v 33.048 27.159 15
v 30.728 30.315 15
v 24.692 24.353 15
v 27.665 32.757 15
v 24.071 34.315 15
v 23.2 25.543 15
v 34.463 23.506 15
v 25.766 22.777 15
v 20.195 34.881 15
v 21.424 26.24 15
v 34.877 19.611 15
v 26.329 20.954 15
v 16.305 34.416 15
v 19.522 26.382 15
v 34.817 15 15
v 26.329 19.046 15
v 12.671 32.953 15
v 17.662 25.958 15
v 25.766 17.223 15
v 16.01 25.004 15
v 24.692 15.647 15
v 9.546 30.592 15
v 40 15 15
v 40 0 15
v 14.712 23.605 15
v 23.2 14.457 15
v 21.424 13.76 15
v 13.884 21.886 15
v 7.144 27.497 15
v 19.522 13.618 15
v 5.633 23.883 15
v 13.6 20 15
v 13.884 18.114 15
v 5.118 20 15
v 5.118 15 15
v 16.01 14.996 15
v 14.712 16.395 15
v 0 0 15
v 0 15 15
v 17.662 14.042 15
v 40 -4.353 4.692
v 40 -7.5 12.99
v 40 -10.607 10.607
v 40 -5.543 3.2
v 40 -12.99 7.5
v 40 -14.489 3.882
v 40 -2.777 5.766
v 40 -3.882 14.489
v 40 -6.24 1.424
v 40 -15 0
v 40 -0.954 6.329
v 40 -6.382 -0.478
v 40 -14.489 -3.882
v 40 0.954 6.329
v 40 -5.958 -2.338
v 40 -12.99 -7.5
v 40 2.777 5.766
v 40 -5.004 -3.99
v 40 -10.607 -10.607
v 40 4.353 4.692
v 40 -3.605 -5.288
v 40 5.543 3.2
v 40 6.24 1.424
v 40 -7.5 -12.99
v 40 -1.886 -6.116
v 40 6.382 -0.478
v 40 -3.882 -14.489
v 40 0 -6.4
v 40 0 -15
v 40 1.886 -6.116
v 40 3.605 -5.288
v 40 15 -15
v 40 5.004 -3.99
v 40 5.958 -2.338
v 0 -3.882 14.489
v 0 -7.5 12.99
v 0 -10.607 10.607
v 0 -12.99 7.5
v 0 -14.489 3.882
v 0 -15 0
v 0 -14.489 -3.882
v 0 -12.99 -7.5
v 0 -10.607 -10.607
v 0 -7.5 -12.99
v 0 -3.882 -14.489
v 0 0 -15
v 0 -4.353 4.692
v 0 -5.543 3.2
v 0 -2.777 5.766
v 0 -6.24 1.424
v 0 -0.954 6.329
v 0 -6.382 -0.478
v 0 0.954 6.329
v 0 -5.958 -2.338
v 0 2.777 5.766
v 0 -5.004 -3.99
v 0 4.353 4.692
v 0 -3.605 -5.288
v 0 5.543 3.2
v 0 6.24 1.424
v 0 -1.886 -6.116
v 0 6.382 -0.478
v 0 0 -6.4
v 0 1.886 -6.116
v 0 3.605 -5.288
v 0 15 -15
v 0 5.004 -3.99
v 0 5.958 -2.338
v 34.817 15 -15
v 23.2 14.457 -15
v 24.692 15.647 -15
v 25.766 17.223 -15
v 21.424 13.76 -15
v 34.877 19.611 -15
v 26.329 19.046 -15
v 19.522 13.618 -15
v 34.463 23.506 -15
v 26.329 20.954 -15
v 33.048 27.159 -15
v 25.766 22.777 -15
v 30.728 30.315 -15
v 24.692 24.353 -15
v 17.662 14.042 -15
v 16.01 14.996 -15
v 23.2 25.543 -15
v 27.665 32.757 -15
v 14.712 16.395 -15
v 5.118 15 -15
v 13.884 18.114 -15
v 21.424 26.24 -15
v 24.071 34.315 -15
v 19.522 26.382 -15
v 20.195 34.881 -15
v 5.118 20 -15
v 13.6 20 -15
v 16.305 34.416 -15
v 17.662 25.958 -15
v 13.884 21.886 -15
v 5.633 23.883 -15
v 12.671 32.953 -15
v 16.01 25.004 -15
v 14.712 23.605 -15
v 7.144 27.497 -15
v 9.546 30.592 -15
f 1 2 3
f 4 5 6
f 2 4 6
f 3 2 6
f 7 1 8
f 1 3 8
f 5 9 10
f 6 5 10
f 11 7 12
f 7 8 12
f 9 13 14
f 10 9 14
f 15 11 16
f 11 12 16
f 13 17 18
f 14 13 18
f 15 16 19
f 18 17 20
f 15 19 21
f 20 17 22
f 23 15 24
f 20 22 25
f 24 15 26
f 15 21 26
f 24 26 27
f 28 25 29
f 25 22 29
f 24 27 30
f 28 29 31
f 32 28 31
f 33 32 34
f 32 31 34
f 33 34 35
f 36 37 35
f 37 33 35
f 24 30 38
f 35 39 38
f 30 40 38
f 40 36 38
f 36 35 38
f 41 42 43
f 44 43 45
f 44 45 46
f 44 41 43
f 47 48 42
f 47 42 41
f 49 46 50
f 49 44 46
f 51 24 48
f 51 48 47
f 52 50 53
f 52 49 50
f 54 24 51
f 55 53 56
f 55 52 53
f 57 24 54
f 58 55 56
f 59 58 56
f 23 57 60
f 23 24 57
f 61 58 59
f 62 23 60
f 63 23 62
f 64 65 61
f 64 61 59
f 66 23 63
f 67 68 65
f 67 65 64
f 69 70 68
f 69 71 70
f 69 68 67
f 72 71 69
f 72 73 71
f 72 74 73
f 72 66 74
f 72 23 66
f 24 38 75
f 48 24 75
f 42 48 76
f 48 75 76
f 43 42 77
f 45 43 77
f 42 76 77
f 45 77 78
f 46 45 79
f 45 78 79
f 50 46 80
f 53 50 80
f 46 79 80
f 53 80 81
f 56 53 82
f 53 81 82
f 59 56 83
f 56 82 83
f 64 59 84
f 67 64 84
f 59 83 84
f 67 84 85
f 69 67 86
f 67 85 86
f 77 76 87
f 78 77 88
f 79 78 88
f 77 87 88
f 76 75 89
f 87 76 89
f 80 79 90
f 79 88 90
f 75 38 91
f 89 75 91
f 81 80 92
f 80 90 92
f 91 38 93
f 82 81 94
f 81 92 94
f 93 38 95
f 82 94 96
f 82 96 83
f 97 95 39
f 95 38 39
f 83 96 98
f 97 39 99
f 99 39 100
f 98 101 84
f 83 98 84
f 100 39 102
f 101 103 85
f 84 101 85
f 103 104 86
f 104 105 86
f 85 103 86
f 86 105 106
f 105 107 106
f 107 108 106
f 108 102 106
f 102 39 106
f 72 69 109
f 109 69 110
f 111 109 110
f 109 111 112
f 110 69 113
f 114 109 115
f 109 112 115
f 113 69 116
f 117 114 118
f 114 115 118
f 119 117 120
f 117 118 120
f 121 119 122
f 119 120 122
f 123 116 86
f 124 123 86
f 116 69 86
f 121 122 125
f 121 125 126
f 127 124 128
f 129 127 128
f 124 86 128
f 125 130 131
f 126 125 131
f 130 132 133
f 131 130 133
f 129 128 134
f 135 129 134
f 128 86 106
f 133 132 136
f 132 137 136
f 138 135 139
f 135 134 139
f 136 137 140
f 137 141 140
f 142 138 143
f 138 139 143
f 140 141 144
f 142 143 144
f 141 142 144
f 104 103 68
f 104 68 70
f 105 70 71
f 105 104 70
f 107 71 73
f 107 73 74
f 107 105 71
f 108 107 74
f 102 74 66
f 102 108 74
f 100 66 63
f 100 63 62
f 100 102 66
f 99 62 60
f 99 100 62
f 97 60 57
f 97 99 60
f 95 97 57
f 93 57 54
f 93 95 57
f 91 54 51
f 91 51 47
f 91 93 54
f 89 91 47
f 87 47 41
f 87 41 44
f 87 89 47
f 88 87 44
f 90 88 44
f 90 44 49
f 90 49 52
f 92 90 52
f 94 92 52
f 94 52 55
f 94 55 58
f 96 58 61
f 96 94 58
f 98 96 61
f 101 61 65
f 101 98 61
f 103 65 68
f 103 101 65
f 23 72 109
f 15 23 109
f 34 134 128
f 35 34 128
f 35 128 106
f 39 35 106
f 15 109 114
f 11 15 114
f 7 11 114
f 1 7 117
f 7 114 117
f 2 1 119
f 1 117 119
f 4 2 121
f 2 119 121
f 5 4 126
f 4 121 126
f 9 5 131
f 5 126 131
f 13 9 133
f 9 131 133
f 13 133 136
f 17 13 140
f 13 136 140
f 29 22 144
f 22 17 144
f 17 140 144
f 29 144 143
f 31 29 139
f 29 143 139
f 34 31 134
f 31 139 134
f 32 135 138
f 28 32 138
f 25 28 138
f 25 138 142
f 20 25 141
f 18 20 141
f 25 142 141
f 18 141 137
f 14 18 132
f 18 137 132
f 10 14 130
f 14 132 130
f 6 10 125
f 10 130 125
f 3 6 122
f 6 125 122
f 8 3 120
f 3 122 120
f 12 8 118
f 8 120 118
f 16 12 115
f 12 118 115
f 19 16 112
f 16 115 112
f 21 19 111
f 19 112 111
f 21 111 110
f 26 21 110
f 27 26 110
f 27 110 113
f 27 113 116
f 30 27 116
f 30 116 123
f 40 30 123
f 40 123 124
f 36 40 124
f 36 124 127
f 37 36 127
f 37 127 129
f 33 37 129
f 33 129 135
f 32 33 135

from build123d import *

# Parameters (mm, degrees)
SKETCH1_R           = 6.4
BOSS_EXTRUDE1_DEPTH = 40
SKETCH3_R           = 6.4
CUT_EXTRUDE1_DEPTH  = 43


with BuildPart() as part:
    # Sketch1 → Boss-Extrude1 (new body)
    with BuildSketch(Plane(origin=(0, 0, 0), x_dir=(0, 0, -1), z_dir=(1, 0, 0))):
        with BuildLine():
            Line((15, 0), (15, 35))
            Line((15, 35), (-15, 35))
            Line((-15, 35), (-15, 0))
            ThreePointArc((-15, 0), (0, -15), (15, 0))
        make_face()
        Circle(SKETCH1_R, mode=Mode.SUBTRACT)
    extrude(amount=BOSS_EXTRUDE1_DEPTH)

    # Sketch3 → Cut-Extrude1 (cut)
    with BuildSketch(Plane(origin=(0, 0, -15), x_dir=(-1, 0, 0), z_dir=(0, 0, -1))):
        with Locations((-20, 20)):
            Circle(SKETCH3_R)
        with BuildLine():
            Line((-46.007478206, 15), (-34.81696458, 15))
            Line((-34.81696458, 15), (-34.877252069, 19.610892924))
            ThreePointArc((-34.877252069, 19.610892924), (-20.194570167, 34.8810677), (-5.11766035, 20))
            Line((-5.11766035, 20), (-5.11766035, 15))
            Line((-5.11766035, 15), (8.555205081, 15))
            Line((8.555205081, 15), (8.555205081, 43.038004213))
            Line((8.555205081, 43.038004213), (-46.007478206, 43.038004213))
            Line((-46.007478206, 43.038004213), (-46.007478206, 15))
        make_face()
    extrude(amount=-CUT_EXTRUDE1_DEPTH, mode=Mode.SUBTRACT)


solid = part.part
